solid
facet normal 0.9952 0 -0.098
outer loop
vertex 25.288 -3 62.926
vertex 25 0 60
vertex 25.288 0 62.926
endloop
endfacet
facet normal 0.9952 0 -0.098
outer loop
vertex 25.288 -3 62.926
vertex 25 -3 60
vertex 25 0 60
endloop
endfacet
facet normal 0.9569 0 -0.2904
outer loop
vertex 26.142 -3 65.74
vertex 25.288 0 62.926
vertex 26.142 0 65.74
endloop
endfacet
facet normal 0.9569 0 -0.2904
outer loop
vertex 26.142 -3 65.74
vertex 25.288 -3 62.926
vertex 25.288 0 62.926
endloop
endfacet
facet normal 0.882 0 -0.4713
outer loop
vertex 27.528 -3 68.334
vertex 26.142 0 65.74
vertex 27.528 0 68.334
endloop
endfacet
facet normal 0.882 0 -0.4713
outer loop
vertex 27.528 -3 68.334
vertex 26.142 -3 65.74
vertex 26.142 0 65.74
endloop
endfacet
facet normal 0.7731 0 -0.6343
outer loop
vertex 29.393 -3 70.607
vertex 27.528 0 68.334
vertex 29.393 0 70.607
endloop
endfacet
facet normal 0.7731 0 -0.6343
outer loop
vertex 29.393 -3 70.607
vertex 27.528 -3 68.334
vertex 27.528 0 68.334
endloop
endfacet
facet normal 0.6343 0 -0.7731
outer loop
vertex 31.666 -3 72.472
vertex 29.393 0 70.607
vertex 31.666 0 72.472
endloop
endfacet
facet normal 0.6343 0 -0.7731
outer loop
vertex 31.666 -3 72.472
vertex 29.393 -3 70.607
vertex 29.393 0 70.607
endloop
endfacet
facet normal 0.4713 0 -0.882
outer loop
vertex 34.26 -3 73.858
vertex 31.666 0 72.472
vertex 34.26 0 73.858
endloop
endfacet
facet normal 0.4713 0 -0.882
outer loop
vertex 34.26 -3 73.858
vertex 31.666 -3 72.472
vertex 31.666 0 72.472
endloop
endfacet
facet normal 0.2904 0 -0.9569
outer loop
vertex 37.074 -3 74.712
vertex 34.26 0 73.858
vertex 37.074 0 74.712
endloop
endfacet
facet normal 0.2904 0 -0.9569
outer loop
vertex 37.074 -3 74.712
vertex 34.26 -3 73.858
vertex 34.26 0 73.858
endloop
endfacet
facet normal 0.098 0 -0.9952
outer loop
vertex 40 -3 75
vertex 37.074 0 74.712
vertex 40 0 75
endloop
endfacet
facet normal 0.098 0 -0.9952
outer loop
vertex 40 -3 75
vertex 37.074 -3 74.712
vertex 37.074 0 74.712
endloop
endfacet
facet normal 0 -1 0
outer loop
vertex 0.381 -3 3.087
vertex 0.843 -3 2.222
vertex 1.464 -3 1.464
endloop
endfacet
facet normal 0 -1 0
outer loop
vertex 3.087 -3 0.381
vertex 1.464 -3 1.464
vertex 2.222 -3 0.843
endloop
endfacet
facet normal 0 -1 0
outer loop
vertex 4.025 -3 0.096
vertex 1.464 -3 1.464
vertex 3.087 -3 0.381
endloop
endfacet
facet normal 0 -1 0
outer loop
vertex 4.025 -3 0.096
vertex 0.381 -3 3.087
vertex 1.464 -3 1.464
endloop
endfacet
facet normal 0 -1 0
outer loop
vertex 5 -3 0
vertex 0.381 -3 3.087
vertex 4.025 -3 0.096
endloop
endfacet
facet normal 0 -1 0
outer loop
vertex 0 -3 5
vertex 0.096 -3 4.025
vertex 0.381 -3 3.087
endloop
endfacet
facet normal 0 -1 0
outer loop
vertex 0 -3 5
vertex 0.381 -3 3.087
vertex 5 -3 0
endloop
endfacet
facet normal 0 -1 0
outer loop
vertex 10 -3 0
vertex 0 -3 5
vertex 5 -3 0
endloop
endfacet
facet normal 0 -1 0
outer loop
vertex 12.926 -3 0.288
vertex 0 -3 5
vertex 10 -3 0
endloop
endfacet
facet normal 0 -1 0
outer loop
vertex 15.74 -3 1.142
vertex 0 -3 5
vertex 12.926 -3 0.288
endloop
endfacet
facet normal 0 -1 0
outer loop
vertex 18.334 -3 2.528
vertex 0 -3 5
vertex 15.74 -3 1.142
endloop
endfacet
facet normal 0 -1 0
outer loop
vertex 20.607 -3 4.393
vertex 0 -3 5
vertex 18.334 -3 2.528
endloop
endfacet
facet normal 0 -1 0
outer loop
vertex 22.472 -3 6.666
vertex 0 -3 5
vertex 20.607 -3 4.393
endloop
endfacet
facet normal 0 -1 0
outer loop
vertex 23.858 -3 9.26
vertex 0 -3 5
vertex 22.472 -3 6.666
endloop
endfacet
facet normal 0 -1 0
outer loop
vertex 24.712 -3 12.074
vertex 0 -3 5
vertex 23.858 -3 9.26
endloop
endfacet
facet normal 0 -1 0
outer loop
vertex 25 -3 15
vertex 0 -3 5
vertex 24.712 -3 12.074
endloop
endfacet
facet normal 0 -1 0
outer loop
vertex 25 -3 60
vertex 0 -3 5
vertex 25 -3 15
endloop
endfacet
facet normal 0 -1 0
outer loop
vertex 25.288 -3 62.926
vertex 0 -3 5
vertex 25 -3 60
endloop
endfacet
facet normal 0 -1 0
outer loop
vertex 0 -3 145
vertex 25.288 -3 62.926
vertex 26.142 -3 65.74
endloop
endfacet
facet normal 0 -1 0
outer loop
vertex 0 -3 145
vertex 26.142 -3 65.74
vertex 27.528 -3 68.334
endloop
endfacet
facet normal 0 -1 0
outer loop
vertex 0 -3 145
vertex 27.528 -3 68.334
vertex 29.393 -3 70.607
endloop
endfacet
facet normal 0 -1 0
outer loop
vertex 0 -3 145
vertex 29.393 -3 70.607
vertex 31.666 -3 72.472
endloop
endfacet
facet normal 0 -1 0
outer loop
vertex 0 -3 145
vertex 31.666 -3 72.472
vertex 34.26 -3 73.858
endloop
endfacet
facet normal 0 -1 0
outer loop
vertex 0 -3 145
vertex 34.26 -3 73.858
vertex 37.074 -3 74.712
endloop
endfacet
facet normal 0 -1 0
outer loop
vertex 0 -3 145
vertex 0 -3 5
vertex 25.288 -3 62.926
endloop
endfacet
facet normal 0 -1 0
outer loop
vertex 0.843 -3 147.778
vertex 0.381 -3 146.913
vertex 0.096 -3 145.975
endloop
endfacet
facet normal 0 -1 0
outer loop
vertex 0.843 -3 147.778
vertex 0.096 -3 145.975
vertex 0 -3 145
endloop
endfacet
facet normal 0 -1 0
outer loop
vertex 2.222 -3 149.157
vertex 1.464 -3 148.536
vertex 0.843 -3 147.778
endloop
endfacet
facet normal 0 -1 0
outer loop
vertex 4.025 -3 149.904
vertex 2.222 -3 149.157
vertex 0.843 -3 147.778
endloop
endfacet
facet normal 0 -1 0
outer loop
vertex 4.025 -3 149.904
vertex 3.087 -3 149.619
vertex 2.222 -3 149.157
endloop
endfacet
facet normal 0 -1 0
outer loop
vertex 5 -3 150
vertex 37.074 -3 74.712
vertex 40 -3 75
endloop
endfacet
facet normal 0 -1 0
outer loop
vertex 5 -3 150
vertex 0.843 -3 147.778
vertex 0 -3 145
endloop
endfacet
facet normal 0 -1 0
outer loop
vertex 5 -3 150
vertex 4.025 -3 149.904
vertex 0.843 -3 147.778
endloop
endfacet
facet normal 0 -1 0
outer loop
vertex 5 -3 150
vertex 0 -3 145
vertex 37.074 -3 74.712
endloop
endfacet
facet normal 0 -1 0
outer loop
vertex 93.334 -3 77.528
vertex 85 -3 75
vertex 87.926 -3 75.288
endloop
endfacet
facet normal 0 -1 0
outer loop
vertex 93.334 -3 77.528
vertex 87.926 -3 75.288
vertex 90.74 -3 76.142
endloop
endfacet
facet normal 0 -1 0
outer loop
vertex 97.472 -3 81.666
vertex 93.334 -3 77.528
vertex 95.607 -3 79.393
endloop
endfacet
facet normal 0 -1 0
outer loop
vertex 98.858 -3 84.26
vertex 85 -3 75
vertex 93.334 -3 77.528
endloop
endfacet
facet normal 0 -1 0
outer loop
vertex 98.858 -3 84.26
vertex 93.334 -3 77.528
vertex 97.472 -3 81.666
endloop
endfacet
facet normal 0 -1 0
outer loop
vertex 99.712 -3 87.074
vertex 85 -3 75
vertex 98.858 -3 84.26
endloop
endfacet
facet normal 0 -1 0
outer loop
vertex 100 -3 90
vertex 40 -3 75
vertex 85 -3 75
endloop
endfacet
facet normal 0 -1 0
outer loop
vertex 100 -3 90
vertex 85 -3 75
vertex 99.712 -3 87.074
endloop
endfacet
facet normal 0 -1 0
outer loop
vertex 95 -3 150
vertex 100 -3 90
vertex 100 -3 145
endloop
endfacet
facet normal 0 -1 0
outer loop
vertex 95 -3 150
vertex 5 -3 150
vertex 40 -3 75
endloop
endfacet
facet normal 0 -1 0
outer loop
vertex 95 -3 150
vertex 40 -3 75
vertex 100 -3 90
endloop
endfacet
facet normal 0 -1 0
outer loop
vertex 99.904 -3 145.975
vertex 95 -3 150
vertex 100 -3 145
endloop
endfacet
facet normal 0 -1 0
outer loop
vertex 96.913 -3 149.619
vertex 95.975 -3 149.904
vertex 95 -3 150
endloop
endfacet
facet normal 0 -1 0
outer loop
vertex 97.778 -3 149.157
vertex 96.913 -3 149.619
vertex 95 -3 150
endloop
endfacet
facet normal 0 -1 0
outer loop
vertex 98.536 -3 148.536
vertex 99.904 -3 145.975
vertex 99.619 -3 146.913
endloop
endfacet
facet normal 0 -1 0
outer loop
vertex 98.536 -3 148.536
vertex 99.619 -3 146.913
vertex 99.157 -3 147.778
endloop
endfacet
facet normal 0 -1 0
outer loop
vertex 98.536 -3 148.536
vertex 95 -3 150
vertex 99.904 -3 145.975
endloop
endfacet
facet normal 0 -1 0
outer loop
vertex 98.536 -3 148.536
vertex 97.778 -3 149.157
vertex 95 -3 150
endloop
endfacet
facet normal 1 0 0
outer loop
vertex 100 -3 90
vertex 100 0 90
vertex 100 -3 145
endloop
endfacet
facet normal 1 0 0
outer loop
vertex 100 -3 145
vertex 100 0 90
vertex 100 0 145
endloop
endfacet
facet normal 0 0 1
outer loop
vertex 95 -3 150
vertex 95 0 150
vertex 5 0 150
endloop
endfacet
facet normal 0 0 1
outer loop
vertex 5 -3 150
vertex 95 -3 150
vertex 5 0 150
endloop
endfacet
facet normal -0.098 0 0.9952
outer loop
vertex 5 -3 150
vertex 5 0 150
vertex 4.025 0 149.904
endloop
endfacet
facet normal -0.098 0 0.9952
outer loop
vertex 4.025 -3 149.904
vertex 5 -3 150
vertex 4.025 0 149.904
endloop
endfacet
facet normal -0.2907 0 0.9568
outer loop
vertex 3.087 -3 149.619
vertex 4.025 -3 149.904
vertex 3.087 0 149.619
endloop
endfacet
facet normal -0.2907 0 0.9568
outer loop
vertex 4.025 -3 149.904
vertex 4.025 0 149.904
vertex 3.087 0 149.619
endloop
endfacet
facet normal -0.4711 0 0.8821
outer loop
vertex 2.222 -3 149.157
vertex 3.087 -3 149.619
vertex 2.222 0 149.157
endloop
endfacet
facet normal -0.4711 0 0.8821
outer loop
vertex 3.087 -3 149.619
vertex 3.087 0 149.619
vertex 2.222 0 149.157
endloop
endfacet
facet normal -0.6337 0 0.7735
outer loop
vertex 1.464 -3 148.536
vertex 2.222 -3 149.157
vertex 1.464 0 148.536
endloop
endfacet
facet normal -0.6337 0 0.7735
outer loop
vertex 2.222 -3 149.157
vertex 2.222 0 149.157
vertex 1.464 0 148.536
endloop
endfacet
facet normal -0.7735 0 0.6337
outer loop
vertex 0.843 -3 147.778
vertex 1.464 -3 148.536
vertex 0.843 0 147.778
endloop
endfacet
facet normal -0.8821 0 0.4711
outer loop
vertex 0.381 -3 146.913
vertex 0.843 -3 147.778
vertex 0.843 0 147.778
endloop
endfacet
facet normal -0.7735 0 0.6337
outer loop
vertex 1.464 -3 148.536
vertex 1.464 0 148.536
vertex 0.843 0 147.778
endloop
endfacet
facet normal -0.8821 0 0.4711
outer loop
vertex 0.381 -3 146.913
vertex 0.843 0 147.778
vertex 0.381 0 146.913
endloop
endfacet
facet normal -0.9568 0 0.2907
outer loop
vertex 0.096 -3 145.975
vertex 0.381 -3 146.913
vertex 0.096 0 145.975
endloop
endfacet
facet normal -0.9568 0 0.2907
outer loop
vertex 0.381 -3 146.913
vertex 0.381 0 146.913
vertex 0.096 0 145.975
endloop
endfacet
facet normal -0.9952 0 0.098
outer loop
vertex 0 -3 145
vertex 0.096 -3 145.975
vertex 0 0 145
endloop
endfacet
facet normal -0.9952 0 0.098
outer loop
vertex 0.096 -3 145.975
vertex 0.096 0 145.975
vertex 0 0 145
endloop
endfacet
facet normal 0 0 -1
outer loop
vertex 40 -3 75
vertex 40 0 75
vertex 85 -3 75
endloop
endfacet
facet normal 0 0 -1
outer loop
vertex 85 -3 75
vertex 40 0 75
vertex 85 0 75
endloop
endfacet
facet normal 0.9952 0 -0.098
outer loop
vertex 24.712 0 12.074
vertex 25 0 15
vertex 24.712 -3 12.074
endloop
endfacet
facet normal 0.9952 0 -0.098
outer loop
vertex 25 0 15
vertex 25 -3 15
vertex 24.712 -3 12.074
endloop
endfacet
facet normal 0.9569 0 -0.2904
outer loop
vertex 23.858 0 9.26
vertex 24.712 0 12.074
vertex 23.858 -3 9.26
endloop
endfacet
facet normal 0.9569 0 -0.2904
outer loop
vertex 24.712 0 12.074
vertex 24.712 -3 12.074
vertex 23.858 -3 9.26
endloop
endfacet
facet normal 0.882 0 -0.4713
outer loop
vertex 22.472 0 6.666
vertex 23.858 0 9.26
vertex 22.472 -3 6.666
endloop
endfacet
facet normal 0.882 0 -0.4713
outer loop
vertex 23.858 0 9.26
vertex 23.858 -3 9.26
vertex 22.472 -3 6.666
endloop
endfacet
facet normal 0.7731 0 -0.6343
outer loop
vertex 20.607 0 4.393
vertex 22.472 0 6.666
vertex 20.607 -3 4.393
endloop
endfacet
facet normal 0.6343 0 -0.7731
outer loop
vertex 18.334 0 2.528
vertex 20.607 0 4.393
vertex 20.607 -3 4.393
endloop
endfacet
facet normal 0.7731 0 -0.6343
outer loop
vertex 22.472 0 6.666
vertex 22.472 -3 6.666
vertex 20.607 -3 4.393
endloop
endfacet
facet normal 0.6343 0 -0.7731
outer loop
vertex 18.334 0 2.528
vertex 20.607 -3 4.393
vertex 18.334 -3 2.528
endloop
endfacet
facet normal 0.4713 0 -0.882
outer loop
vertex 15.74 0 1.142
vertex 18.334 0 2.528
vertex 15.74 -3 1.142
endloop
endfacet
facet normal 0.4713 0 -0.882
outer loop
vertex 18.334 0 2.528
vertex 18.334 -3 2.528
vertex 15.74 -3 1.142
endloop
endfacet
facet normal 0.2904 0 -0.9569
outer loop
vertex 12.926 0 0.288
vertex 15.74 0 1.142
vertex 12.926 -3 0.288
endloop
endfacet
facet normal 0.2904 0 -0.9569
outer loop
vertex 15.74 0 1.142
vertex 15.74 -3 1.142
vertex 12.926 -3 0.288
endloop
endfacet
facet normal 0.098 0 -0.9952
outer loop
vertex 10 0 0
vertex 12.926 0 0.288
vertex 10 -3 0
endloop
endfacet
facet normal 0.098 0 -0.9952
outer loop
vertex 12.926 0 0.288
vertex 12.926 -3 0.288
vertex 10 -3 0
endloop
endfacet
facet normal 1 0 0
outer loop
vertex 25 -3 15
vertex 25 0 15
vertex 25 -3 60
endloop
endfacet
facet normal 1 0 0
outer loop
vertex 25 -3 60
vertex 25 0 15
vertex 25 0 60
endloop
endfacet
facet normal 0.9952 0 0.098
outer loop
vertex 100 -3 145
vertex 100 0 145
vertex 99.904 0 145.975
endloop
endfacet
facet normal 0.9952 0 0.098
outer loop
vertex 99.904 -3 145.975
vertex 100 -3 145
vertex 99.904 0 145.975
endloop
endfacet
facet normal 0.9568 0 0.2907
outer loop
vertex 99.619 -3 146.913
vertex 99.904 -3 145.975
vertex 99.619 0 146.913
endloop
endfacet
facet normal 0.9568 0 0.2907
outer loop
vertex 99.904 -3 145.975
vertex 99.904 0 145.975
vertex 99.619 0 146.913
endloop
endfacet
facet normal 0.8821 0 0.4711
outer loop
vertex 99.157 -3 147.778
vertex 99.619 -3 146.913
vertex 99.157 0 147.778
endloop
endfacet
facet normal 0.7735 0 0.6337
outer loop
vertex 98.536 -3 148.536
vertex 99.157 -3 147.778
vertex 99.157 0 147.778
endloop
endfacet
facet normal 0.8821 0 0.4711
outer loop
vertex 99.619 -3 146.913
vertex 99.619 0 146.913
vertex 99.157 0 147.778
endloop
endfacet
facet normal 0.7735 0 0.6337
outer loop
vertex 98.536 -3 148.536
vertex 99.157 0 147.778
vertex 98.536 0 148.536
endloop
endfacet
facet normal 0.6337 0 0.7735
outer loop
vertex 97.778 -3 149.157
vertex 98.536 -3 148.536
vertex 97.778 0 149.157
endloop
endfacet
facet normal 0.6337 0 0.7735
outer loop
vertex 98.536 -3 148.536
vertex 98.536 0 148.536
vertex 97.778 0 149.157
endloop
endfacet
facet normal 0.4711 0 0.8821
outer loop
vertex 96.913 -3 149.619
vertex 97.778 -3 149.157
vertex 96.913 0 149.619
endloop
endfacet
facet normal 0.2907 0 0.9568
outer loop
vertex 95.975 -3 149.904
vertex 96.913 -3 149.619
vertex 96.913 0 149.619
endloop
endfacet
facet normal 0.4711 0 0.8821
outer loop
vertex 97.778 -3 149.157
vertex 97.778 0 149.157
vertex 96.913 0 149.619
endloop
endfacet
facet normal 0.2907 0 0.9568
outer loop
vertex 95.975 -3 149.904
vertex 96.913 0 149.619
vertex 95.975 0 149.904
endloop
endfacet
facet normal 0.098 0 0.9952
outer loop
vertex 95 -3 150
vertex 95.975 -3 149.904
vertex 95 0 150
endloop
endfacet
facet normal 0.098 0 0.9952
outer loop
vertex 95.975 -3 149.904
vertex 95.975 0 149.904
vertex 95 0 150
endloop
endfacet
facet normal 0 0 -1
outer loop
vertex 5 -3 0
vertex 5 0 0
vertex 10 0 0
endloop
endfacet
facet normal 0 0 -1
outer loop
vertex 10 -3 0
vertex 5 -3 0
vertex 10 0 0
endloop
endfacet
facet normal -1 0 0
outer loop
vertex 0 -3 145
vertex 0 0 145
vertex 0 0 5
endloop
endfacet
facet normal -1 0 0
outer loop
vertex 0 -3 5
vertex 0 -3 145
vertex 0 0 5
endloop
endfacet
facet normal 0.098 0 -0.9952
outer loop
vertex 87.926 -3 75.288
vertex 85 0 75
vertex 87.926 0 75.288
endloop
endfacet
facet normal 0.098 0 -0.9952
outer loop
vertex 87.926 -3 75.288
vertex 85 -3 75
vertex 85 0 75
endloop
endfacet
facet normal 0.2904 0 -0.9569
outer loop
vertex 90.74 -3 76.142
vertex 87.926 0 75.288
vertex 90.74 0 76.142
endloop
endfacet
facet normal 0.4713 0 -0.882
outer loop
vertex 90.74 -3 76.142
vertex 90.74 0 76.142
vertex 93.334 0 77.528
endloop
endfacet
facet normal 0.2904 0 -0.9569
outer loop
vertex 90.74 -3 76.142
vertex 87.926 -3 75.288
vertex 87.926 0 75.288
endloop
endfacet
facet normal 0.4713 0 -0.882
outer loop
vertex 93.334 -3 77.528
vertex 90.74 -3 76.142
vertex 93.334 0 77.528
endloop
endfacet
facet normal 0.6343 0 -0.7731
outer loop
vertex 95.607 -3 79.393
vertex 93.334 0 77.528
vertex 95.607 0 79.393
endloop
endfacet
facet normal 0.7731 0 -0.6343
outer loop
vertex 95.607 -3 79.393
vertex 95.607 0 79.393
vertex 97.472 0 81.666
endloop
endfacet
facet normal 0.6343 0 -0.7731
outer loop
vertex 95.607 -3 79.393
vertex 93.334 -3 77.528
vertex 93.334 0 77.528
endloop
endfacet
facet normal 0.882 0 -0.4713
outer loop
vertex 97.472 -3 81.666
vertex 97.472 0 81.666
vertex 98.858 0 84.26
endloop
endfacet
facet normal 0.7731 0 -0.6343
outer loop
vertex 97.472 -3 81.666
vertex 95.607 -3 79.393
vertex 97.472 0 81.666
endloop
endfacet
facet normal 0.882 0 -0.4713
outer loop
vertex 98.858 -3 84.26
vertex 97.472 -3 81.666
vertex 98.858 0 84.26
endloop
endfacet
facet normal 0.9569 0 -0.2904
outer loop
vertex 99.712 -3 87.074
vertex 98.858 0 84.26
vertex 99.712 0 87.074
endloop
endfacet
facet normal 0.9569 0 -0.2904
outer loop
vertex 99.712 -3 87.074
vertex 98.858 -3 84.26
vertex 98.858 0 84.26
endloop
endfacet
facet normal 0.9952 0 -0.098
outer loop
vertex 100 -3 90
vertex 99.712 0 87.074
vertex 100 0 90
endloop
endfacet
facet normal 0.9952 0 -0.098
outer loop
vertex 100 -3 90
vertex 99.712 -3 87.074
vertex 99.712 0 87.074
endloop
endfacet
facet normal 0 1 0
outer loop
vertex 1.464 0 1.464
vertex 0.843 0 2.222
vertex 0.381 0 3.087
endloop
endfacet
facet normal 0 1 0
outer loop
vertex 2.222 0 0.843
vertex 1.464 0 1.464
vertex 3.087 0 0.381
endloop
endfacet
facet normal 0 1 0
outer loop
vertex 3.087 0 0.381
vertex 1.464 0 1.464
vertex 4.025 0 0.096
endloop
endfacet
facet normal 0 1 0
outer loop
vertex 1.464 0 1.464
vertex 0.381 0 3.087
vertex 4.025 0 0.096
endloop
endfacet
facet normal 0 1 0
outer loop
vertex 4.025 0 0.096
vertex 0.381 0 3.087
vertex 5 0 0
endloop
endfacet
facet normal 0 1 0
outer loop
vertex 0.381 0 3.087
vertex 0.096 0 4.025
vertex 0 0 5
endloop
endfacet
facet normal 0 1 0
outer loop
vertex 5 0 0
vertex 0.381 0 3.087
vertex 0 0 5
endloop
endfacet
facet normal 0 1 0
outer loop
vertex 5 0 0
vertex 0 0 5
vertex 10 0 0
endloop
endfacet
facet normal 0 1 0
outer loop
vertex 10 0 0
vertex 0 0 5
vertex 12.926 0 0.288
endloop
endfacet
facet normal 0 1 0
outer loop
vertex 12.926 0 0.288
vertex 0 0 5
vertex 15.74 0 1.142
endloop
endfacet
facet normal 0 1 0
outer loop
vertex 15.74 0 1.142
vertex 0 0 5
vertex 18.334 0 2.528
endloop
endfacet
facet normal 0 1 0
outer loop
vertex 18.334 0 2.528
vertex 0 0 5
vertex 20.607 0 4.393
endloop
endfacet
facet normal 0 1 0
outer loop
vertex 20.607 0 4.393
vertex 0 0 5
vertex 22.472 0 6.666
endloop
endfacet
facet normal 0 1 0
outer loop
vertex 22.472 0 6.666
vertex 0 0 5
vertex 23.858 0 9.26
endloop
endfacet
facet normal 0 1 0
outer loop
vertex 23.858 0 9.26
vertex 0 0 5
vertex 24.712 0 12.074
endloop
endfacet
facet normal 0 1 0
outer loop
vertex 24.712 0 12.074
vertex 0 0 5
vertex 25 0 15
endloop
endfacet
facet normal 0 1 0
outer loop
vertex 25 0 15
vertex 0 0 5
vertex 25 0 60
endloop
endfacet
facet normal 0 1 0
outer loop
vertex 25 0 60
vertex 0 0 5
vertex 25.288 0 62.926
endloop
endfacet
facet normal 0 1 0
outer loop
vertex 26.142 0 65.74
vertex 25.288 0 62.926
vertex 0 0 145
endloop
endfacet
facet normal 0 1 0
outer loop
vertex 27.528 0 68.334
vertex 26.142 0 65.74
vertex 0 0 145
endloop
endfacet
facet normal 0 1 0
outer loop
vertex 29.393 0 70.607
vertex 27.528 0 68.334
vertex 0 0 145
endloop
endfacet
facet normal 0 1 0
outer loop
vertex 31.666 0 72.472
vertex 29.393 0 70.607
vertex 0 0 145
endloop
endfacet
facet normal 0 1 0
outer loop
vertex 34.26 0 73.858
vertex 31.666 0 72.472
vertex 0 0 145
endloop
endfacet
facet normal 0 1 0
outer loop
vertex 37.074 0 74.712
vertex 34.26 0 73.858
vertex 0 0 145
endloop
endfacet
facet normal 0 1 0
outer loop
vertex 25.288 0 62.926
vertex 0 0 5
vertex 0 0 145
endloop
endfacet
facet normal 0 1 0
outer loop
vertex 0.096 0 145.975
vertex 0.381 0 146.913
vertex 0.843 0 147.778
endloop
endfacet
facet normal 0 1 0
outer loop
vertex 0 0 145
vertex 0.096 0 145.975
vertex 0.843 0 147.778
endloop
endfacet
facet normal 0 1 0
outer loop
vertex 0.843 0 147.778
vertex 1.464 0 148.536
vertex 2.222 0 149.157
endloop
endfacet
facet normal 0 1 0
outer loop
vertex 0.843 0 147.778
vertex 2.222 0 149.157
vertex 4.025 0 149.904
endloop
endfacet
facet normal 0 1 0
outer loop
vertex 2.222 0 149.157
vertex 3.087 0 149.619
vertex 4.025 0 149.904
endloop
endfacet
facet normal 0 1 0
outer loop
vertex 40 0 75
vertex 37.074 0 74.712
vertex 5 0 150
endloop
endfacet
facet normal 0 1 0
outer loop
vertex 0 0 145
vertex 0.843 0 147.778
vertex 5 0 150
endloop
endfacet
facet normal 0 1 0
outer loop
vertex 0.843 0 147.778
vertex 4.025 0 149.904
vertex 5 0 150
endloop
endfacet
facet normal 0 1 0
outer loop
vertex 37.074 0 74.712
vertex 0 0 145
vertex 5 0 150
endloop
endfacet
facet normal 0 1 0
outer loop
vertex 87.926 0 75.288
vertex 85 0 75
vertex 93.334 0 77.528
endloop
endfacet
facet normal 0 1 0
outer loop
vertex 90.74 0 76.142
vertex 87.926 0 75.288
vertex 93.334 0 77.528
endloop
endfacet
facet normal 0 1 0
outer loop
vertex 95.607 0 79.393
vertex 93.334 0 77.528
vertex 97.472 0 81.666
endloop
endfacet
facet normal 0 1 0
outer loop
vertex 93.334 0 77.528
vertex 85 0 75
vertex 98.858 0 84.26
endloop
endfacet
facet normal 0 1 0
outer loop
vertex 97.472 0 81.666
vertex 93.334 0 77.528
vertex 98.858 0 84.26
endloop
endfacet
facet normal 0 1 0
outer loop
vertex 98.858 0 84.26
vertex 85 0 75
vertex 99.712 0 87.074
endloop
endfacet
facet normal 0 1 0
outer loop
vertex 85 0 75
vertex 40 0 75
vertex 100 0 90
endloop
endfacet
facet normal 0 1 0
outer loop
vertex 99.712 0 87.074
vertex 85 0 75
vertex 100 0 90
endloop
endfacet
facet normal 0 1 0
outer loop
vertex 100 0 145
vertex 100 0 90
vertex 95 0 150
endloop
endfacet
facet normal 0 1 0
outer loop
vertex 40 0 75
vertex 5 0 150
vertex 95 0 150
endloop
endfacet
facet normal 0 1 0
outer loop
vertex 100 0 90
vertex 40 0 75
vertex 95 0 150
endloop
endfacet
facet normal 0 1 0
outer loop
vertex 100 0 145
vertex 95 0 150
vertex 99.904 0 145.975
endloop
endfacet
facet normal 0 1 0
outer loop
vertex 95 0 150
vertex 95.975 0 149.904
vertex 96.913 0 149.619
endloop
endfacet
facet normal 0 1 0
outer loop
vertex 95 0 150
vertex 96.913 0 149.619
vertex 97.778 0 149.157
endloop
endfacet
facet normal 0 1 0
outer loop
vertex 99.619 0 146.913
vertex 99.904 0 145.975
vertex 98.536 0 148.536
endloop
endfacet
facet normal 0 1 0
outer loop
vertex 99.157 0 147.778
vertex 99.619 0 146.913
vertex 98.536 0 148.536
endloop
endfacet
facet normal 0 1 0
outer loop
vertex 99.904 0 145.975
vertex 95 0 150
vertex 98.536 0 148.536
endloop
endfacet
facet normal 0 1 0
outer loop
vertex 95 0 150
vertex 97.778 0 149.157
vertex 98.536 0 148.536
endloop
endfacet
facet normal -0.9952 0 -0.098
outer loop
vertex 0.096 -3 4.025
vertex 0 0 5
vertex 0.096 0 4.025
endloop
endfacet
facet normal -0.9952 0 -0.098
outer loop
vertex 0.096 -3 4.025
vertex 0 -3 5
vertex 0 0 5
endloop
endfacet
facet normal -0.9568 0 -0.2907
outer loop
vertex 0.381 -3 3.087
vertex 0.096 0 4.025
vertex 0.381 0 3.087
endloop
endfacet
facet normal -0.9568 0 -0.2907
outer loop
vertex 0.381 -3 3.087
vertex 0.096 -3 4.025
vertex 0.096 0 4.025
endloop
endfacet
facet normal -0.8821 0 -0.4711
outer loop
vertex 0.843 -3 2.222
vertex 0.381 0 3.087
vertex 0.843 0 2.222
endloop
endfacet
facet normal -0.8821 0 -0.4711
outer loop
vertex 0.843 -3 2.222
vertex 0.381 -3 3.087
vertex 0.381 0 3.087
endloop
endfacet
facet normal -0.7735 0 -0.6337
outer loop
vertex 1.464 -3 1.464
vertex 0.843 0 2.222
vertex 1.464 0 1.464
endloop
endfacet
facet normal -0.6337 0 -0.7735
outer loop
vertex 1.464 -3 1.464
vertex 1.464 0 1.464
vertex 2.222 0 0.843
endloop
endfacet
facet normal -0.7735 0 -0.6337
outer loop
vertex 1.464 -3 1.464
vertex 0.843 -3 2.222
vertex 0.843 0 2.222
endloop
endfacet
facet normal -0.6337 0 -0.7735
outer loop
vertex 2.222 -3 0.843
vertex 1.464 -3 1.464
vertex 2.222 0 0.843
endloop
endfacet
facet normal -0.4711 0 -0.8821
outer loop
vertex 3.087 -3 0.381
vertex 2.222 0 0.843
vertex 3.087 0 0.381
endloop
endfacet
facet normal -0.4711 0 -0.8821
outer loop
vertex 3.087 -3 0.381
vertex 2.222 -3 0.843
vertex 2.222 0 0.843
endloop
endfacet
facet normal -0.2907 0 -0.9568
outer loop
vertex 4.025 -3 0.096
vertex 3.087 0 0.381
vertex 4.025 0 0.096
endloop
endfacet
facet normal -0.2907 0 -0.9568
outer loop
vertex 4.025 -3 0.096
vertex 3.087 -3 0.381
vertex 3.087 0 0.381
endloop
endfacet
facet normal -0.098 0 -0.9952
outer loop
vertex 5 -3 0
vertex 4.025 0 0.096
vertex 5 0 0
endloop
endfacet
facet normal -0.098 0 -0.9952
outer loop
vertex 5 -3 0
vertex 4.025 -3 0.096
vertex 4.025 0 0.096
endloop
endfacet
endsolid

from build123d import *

# Parameters (mm, degrees)
F1_DEPTH = 3
F2_R     = 5
F3_R     = 15
F4_R     = 15
F5_R     = 15


with BuildPart() as f1:
    # F0 (on Front) → F1 (new body)
    with BuildSketch(Plane.XZ):
        with BuildLine():
            Line((0, 145), (0, 0))
            Line((0, 0), (25, 0))
            Line((25, 0), (25, 75))
            Line((25, 75), (100, 75))
            Line((100, 75), (100, 145))
            ThreePointArc((100, 145), (98.535534, 148.535534), (95, 150))
            Line((95, 150), (5, 150))
            ThreePointArc((5, 150), (1.464466, 148.535534), (0, 145))
        make_face()
    extrude(amount=F1_DEPTH)

    # F2
    f2_edges = [f1.edges().sort_by_distance(p)[0] for p in [
        (0, -1.5, 0),
    ]]
    fillet(f2_edges, radius=F2_R)

    # F3
    f3_edges = [f1.edges().sort_by_distance(p)[0] for p in [
        (100, -1.5, 75),
    ]]
    fillet(f3_edges, radius=F3_R)

    # F4
    f4_edges = [f1.edges().sort_by_distance(p)[0] for p in [
        (25, -1.5, 0),
    ]]
    fillet(f4_edges, radius=F4_R)

    # F5
    f5_edges = [f1.edges().sort_by_distance(p)[0] for p in [
        (25, -1.5, 75),
    ]]
    fillet(f5_edges, radius=F5_R)


solid = f1.part
